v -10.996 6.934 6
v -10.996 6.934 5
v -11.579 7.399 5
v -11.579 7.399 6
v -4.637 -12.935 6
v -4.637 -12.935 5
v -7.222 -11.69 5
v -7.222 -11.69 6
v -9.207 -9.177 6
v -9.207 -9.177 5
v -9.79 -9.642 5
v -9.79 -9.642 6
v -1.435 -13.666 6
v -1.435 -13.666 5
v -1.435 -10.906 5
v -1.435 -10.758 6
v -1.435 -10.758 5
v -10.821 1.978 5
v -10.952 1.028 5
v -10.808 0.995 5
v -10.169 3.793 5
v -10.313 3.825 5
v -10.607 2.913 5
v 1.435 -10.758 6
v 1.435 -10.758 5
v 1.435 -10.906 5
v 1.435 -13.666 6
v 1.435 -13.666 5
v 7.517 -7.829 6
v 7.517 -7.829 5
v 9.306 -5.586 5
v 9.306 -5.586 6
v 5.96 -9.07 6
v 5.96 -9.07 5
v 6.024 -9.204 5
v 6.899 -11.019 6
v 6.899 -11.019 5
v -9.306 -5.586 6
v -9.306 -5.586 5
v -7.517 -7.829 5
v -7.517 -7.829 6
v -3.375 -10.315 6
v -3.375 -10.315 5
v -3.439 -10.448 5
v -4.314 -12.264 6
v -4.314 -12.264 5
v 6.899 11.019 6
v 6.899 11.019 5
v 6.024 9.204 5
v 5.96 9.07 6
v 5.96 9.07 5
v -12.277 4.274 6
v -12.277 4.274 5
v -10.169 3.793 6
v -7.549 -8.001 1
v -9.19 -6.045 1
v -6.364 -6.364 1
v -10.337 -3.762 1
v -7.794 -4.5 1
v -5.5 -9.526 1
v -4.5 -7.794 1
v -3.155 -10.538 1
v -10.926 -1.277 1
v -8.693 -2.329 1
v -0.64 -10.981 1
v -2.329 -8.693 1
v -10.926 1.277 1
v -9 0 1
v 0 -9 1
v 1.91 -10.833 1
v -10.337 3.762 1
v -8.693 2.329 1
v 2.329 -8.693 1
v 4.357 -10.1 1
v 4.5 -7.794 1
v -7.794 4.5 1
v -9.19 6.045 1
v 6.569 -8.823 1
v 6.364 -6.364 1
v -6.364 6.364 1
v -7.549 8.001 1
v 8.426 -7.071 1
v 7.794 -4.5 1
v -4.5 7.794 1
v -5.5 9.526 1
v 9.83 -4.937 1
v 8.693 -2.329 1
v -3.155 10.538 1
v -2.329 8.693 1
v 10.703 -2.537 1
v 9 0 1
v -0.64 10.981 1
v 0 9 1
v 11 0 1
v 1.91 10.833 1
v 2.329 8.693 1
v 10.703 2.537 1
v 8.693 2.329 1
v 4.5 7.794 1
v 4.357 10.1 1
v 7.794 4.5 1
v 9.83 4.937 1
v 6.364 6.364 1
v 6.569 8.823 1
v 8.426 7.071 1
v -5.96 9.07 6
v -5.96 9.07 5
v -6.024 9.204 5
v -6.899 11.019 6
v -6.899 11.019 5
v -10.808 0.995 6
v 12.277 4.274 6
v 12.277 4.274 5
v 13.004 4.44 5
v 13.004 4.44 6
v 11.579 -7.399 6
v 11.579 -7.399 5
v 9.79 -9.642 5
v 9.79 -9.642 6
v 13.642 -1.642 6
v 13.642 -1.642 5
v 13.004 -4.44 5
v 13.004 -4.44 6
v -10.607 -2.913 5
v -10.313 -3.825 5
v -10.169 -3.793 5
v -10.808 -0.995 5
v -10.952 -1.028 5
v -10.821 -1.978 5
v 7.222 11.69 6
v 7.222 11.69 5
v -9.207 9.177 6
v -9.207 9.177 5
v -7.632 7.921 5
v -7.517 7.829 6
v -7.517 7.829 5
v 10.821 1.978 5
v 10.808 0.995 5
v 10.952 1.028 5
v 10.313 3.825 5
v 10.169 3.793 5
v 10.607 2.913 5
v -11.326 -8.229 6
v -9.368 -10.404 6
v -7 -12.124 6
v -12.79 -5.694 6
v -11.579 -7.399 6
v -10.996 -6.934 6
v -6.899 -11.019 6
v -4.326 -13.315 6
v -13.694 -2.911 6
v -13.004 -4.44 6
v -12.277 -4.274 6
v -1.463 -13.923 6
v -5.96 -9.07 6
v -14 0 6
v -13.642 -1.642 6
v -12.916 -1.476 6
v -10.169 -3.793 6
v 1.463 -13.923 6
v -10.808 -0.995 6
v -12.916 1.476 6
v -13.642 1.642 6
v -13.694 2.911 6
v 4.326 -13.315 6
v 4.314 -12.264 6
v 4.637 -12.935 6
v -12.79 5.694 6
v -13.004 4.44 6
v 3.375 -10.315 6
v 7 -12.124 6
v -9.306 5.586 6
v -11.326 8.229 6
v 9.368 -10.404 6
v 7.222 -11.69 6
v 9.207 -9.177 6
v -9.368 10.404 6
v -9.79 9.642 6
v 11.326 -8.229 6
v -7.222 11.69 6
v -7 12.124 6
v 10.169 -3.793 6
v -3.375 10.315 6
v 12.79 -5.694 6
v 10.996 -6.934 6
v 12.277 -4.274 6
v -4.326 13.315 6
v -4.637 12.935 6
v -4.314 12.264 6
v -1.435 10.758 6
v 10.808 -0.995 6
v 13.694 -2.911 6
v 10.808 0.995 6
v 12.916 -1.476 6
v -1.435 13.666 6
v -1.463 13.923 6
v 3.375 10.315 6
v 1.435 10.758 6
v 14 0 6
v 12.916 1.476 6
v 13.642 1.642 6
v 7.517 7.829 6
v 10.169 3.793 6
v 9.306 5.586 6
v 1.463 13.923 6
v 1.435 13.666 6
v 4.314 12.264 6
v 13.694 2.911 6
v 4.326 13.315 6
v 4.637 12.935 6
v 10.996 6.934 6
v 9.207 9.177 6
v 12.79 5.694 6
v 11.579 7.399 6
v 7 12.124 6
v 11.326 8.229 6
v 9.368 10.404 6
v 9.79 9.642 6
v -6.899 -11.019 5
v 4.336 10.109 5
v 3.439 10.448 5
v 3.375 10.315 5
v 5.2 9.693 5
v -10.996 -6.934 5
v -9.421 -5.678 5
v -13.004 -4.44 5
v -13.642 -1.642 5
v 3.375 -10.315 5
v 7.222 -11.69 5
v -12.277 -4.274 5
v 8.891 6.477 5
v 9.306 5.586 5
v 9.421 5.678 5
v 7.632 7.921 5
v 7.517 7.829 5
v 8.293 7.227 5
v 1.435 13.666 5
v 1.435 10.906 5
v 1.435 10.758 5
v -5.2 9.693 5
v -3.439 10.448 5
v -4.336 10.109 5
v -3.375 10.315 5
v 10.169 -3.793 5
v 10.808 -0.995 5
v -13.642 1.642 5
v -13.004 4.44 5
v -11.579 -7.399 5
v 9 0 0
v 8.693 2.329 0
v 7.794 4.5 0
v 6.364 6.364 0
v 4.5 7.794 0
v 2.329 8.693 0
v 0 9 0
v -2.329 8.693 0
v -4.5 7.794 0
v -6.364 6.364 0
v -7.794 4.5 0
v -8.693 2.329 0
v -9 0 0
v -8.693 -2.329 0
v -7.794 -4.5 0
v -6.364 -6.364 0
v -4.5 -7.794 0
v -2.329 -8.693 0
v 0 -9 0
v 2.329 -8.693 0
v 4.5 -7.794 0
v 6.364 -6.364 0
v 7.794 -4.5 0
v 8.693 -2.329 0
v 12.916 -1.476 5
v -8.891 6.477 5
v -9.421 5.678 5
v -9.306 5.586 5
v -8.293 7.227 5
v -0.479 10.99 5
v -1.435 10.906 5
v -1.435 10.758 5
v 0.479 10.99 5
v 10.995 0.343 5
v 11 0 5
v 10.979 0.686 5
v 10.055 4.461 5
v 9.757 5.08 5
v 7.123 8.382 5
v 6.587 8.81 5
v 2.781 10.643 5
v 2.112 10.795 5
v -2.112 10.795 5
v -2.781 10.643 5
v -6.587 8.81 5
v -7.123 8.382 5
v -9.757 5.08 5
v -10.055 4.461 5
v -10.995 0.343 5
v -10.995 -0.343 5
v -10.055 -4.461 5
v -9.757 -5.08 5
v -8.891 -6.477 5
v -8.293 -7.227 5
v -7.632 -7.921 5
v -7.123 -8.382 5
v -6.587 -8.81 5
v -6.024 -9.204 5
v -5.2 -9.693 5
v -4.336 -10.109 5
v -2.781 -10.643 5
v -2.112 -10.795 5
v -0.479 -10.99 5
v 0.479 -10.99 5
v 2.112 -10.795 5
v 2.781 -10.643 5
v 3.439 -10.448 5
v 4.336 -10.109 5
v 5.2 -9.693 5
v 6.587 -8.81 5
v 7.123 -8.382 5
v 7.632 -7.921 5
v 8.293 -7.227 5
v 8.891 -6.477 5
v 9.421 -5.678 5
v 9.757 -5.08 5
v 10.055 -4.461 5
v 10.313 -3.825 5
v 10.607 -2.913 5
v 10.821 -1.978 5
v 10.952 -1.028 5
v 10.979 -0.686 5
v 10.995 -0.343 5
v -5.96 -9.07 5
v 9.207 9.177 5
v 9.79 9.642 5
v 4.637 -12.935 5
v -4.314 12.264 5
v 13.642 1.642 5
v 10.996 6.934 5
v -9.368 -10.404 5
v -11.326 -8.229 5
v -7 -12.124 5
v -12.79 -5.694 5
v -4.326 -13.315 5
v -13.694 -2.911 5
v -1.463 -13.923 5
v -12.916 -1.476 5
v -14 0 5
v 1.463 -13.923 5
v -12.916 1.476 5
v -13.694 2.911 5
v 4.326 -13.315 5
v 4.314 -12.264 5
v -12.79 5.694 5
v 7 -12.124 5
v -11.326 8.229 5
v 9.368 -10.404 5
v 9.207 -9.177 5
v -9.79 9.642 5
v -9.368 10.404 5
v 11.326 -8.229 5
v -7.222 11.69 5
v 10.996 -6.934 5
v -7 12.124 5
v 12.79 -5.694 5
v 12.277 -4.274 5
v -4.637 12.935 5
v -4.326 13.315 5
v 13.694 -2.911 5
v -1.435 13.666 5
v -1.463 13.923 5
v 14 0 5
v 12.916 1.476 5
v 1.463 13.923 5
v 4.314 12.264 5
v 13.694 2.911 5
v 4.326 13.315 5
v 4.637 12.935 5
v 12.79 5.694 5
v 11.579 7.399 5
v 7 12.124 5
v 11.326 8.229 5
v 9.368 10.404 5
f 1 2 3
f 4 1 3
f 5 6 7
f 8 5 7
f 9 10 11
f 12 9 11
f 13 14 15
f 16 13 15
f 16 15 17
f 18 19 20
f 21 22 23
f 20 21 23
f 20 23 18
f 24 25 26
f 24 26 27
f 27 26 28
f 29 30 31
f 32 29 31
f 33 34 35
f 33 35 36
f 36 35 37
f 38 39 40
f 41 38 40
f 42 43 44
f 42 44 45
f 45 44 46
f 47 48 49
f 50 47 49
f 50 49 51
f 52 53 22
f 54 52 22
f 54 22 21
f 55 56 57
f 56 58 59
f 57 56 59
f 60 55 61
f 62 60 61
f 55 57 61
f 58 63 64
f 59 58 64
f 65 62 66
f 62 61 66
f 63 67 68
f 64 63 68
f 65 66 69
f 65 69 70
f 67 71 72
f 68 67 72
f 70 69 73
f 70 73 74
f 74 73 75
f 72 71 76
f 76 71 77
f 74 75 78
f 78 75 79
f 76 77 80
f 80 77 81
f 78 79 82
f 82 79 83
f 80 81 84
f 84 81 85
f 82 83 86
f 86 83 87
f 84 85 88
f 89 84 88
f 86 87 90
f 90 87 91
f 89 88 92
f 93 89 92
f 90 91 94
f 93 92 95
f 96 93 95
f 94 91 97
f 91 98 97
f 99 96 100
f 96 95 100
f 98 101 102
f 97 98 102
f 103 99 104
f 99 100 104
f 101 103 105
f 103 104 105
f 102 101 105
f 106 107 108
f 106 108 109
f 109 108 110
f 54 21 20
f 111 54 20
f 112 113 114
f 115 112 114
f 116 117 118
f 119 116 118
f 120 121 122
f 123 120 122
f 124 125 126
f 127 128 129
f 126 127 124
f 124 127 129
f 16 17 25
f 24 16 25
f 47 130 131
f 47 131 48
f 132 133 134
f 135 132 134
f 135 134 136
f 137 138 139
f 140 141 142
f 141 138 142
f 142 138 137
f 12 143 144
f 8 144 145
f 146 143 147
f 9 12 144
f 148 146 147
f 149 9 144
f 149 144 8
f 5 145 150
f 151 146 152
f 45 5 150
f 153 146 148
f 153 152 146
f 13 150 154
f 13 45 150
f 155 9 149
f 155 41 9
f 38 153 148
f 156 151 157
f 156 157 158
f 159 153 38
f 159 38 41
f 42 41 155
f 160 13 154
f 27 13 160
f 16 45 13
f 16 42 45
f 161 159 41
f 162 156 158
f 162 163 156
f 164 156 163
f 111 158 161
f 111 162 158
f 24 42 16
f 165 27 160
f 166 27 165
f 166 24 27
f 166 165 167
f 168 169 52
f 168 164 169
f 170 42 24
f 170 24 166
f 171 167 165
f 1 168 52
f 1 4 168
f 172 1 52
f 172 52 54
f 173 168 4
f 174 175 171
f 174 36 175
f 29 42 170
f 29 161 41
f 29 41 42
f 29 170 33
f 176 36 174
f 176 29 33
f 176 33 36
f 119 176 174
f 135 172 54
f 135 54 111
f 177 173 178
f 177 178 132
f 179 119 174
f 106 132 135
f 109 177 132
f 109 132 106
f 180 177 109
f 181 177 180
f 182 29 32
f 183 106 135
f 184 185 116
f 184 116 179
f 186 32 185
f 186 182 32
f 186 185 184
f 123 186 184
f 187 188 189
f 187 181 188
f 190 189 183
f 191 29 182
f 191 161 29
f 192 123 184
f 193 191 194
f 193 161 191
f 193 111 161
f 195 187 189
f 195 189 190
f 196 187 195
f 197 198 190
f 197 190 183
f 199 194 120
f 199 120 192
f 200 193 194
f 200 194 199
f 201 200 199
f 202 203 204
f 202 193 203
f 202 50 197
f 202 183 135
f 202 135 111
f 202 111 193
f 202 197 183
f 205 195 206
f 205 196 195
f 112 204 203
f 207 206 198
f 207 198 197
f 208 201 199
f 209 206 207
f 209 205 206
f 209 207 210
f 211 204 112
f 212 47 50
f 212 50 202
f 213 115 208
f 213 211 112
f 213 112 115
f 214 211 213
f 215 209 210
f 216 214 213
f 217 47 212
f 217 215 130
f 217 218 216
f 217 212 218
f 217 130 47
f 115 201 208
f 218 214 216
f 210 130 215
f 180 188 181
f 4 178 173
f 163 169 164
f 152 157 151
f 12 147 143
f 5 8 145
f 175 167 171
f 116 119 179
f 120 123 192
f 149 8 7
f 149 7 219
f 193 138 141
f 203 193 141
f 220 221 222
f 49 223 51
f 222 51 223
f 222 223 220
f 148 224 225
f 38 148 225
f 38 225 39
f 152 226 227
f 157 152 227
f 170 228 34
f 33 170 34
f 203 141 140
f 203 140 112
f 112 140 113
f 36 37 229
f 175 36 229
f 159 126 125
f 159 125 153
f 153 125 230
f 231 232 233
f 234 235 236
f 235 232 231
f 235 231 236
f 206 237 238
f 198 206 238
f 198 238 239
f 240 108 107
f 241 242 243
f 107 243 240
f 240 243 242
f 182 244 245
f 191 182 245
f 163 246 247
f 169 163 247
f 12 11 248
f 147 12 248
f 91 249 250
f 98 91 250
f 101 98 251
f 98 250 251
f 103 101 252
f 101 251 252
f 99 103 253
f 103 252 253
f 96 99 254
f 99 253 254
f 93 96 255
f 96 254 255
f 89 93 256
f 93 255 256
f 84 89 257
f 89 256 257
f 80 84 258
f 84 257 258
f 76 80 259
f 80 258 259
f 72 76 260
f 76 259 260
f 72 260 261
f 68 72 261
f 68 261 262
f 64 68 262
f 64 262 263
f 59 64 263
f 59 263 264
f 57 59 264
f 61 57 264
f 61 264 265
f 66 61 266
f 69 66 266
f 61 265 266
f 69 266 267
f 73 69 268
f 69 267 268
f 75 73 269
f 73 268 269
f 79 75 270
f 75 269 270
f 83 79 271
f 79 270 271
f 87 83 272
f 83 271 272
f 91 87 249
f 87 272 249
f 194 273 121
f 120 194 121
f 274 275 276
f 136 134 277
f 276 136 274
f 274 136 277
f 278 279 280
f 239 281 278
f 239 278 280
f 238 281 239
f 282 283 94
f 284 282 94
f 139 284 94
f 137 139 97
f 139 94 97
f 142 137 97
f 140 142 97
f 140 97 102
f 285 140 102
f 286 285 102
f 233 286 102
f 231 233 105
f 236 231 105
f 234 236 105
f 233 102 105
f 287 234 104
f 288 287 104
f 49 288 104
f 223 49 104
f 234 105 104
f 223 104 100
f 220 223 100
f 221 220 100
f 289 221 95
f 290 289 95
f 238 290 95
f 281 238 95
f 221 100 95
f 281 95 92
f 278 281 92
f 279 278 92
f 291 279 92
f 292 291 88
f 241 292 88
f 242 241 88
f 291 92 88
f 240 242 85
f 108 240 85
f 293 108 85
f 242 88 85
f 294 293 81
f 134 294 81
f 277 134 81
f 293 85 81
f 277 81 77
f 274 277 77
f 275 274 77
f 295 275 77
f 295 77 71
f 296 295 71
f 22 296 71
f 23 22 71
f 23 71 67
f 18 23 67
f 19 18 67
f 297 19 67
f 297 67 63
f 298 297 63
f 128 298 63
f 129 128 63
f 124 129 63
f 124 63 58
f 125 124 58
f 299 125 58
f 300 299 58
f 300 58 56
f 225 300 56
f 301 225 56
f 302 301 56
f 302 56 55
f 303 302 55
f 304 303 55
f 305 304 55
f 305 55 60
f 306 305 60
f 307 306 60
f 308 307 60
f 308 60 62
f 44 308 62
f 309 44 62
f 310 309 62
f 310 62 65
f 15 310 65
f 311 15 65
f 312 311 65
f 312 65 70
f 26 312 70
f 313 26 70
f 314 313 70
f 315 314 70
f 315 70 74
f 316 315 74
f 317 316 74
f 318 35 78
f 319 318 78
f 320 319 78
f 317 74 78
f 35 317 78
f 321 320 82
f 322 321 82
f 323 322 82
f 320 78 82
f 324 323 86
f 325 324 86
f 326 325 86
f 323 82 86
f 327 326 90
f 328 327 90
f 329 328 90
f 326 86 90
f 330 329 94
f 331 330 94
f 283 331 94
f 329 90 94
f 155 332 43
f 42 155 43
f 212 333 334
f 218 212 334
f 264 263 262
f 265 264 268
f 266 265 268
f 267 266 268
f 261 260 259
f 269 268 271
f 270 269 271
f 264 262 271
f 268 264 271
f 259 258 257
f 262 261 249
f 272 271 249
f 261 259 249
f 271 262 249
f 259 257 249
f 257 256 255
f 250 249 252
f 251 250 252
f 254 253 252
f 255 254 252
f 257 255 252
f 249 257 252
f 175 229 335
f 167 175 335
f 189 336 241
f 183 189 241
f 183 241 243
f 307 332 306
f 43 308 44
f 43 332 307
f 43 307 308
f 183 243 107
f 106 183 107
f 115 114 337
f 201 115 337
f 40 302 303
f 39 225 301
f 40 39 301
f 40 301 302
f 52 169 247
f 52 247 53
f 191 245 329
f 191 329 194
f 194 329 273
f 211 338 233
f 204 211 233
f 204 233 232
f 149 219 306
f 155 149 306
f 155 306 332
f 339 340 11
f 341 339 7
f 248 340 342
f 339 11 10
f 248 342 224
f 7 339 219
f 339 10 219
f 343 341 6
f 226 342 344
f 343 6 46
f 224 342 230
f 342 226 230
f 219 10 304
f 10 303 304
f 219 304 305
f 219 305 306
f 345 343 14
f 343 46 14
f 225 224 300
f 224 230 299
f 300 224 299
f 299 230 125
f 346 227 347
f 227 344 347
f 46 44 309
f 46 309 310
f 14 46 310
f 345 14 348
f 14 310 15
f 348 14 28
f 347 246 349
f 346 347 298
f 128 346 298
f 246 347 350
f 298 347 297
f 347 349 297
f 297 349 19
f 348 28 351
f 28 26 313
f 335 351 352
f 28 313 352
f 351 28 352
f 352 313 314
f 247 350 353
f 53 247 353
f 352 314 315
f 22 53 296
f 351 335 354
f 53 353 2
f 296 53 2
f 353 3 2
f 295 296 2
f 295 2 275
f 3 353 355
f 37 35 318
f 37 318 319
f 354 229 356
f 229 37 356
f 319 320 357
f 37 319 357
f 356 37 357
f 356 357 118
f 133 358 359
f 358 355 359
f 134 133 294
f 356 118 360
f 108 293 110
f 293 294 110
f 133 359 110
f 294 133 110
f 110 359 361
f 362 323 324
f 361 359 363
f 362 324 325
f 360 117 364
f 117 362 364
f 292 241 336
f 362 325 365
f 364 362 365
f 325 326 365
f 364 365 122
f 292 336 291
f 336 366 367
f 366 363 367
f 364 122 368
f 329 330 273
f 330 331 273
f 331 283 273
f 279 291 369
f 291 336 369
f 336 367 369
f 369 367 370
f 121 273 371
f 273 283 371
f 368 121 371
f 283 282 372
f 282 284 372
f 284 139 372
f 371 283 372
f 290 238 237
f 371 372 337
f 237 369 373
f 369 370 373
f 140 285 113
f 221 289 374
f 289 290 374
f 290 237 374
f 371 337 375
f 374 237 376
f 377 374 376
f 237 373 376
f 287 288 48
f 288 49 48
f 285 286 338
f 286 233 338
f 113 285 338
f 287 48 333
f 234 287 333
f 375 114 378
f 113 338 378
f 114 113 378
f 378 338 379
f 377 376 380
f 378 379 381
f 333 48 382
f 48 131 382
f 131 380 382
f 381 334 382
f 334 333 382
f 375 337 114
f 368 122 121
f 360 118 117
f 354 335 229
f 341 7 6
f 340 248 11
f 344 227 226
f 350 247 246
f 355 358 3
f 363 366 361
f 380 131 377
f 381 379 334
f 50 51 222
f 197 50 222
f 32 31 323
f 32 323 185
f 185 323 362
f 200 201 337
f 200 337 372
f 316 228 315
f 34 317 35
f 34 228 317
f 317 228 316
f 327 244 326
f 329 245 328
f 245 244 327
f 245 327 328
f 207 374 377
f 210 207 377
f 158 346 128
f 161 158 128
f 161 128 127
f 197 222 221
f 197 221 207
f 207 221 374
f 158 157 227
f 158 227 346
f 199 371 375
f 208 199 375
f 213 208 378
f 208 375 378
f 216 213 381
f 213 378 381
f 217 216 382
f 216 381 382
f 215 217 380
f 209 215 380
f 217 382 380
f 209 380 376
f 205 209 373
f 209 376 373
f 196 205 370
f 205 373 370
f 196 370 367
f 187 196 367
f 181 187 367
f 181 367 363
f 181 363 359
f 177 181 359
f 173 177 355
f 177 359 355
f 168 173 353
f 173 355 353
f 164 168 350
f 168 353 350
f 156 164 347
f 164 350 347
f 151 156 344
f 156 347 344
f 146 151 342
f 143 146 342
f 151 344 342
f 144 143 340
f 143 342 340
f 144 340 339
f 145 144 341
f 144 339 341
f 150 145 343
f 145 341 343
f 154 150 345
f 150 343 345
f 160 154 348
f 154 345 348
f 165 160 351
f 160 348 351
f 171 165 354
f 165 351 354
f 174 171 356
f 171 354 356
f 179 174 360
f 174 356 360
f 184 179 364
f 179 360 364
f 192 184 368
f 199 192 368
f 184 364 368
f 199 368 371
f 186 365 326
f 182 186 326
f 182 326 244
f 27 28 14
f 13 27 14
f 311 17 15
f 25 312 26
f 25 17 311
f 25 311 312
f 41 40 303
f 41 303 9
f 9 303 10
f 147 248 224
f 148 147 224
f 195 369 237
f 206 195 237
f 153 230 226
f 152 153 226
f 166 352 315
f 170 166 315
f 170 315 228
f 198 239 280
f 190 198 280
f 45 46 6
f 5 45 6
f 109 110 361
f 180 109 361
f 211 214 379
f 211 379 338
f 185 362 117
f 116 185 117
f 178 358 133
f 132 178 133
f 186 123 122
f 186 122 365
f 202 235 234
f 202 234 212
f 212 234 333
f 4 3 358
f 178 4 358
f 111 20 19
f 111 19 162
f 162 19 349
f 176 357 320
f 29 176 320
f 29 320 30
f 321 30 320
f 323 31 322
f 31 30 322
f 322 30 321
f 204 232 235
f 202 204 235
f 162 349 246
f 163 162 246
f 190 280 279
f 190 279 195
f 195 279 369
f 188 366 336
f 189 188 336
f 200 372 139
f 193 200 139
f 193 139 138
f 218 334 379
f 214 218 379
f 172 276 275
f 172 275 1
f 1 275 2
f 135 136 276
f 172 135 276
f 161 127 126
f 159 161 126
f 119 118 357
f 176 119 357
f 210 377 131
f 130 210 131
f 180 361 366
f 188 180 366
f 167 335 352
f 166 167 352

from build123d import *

# Parameters (mm, degrees)
F0_R     = 9
F1_DEPTH = 1
F3_R     = 11
F4_DEPTH = 4
F6_R     = 14
F7_DEPTH = 1


with BuildPart() as f1:
    # F0 (on Top) → F1 (new body)
    with BuildSketch(Plane.XY):
        Circle(F0_R)
    extrude(amount=F1_DEPTH)

    # F3 (on offset) → F4 (join)
    with BuildSketch(Plane.XY.offset(1)):
        Circle(F3_R)
    extrude(amount=F4_DEPTH)

    # F6 (on offset) → F7 (join)
    with BuildSketch(Plane.XY.offset(5)):
        Circle(F6_R)
        with BuildLine():
            ThreePointArc((12.91588, 1.476495), (12.978953, 0.739444), (13, 0))
            ThreePointArc((13, 0), (12.978953, -0.739444), (12.91588, -1.476495))
            Line((12.91588, -1.476495), (13.642398, -1.642317))
            Line((13.642398, -1.642317), (13.003951, -4.439538))
            Line((13.003951, -4.439538), (12.277433, -4.273715))
            ThreePointArc((12.277433, -4.273715), (11.712595, -5.640489), (10.996179, -6.934266))
            Line((10.996179, -6.934266), (11.578801, -7.398892))
            Line((11.578801, -7.398892), (9.789912, -9.642088))
            Line((9.789912, -9.642088), (9.20729, -9.177463))
            ThreePointArc((9.20729, -9.177463), (8.105367, -10.163809), (6.89855, -11.018621))
            Line((6.89855, -11.018621), (7.221881, -11.690024))
            Line((7.221881, -11.690024), (4.63686, -12.934905))
            Line((4.63686, -12.934905), (4.31353, -12.263501))
            ThreePointArc((4.31353, -12.263501), (2.892772, -12.674063), (1.434578, -12.920603))
            Line((1.434578, -12.920603), (1.434578, -13.665805))
            Line((1.434578, -13.665805), (-1.434578, -13.665805))
            Line((-1.434578, -13.665805), (-1.434578, -12.920603))
            ThreePointArc((-1.434578, -12.920603), (-2.892772, -12.674063), (-4.31353, -12.263501))
            Line((-4.31353, -12.263501), (-4.63686, -12.934905))
            Line((-4.63686, -12.934905), (-7.221881, -11.690024))
            Line((-7.221881, -11.690024), (-6.89855, -11.018621))
            ThreePointArc((-6.89855, -11.018621), (-8.105367, -10.163809), (-9.20729, -9.177463))
            Line((-9.20729, -9.177463), (-9.789912, -9.642088))
            Line((-9.789912, -9.642088), (-11.578801, -7.398892))
            Line((-11.578801, -7.398892), (-10.996179, -6.934266))
            ThreePointArc((-10.996179, -6.934266), (-11.712595, -5.640489), (-12.277433, -4.273715))
            Line((-12.277433, -4.273715), (-13.003951, -4.439538))
            Line((-13.003951, -4.439538), (-13.642398, -1.642317))
            Line((-13.642398, -1.642317), (-12.91588, -1.476495))
            ThreePointArc((-12.91588, -1.476495), (-13, 0), (-12.91588, 1.476495))
            Line((-12.91588, 1.476495), (-13.642398, 1.642317))
            Line((-13.642398, 1.642317), (-13.003951, 4.439538))
            Line((-13.003951, 4.439538), (-12.277433, 4.273715))
            ThreePointArc((-12.277433, 4.273715), (-11.712595, 5.640489), (-10.996179, 6.934266))
            Line((-10.996179, 6.934266), (-11.578801, 7.398892))
            Line((-11.578801, 7.398892), (-9.789912, 9.642088))
            Line((-9.789912, 9.642088), (-9.20729, 9.177463))
            ThreePointArc((-9.20729, 9.177463), (-8.105367, 10.163809), (-6.89855, 11.018621))
            Line((-6.89855, 11.018621), (-7.221881, 11.690024))
            Line((-7.221881, 11.690024), (-4.63686, 12.934905))
            Line((-4.63686, 12.934905), (-4.31353, 12.263501))
            ThreePointArc((-4.31353, 12.263501), (-2.892772, 12.674063), (-1.434578, 12.920603))
            Line((-1.434578, 12.920603), (-1.434578, 13.665805))
            Line((-1.434578, 13.665805), (1.434578, 13.665805))
            Line((1.434578, 13.665805), (1.434578, 12.920603))
            ThreePointArc((1.434578, 12.920603), (2.892772, 12.674063), (4.31353, 12.263501))
            Line((4.31353, 12.263501), (4.63686, 12.934905))
            Line((4.63686, 12.934905), (7.221881, 11.690024))
            Line((7.221881, 11.690024), (6.89855, 11.018621))
            ThreePointArc((6.89855, 11.018621), (8.105367, 10.163809), (9.20729, 9.177463))
            Line((9.20729, 9.177463), (9.789912, 9.642088))
            Line((9.789912, 9.642088), (11.578801, 7.398892))
            Line((11.578801, 7.398892), (10.996179, 6.934266))
            ThreePointArc((10.996179, 6.934266), (11.712595, 5.640489), (12.277433, 4.273715))
            Line((12.277433, 4.273715), (13.003951, 4.439538))
            Line((13.003951, 4.439538), (13.642398, 1.642317))
            Line((13.642398, 1.642317), (12.91588, 1.476495))
        make_face(mode=Mode.SUBTRACT)
        with BuildLine():
            ThreePointArc((12.91588, -1.476495), (12.978953, -0.739444), (13, 0))
            ThreePointArc((13, 0), (12.978953, 0.739444), (12.91588, 1.476495))
            Line((12.91588, 1.476495), (10.807824, 0.995345))
            Line((10.807824, 0.995345), (10.169377, 3.792565))
            Line((10.169377, 3.792565), (12.277433, 4.273715))
            ThreePointArc((12.277433, 4.273715), (11.712595, 5.640489), (10.996179, 6.934266))
            Line((10.996179, 6.934266), (9.30565, 5.586114))
            Line((9.30565, 5.586114), (7.51676, 7.82931))
            Line((7.51676, 7.82931), (9.20729, 9.177463))
            ThreePointArc((9.20729, 9.177463), (8.105367, 10.163809), (6.89855, 11.018621))
            Line((6.89855, 11.018621), (5.960377, 9.070485))
            Line((5.960377, 9.070485), (3.375356, 10.315365))
            Line((3.375356, 10.315365), (4.31353, 12.263501))
            ThreePointArc((4.31353, 12.263501), (2.892772, 12.674063), (1.434578, 12.920603))
            Line((1.434578, 12.920603), (1.434578, 10.758335))
            Line((1.434578, 10.758335), (-1.434578, 10.758335))
            Line((-1.434578, 10.758335), (-1.434578, 12.920603))
            ThreePointArc((-1.434578, 12.920603), (-2.892772, 12.674063), (-4.31353, 12.263501))
            Line((-4.31353, 12.263501), (-3.375356, 10.315365))
            Line((-3.375356, 10.315365), (-5.960377, 9.070485))
            Line((-5.960377, 9.070485), (-6.89855, 11.018621))
            ThreePointArc((-6.89855, 11.018621), (-8.105367, 10.163809), (-9.20729, 9.177463))
            Line((-9.20729, 9.177463), (-7.51676, 7.82931))
            Line((-7.51676, 7.82931), (-9.30565, 5.586114))
            Line((-9.30565, 5.586114), (-10.996179, 6.934266))
            ThreePointArc((-10.996179, 6.934266), (-11.712595, 5.640489), (-12.277433, 4.273715))
            Line((-12.277433, 4.273715), (-10.169377, 3.792565))
            Line((-10.169377, 3.792565), (-10.807824, 0.995345))
            Line((-10.807824, 0.995345), (-12.91588, 1.476495))
            ThreePointArc((-12.91588, 1.476495), (-13, 0), (-12.91588, -1.476495))
            Line((-12.91588, -1.476495), (-10.807824, -0.995345))
            Line((-10.807824, -0.995345), (-10.169377, -3.792565))
            Line((-10.169377, -3.792565), (-12.277433, -4.273715))
            ThreePointArc((-12.277433, -4.273715), (-11.712595, -5.640489), (-10.996179, -6.934266))
            Line((-10.996179, -6.934266), (-9.30565, -5.586114))
            Line((-9.30565, -5.586114), (-7.51676, -7.82931))
            Line((-7.51676, -7.82931), (-9.20729, -9.177463))
            ThreePointArc((-9.20729, -9.177463), (-8.105367, -10.163809), (-6.89855, -11.018621))
            Line((-6.89855, -11.018621), (-5.960377, -9.070485))
            Line((-5.960377, -9.070485), (-3.375356, -10.315365))
            Line((-3.375356, -10.315365), (-4.31353, -12.263501))
            ThreePointArc((-4.31353, -12.263501), (-2.892772, -12.674063), (-1.434578, -12.920603))
            Line((-1.434578, -12.920603), (-1.434578, -10.758335))
            Line((-1.434578, -10.758335), (1.434578, -10.758335))
            Line((1.434578, -10.758335), (1.434578, -12.920603))
            ThreePointArc((1.434578, -12.920603), (2.892772, -12.674063), (4.31353, -12.263501))
            Line((4.31353, -12.263501), (3.375356, -10.315365))
            Line((3.375356, -10.315365), (5.960377, -9.070485))
            Line((5.960377, -9.070485), (6.89855, -11.018621))
            ThreePointArc((6.89855, -11.018621), (8.105367, -10.163809), (9.20729, -9.177463))
            Line((9.20729, -9.177463), (7.51676, -7.82931))
            Line((7.51676, -7.82931), (9.30565, -5.586114))
            Line((9.30565, -5.586114), (10.996179, -6.934266))
            ThreePointArc((10.996179, -6.934266), (11.712595, -5.640489), (12.277433, -4.273715))
            Line((12.277433, -4.273715), (10.169377, -3.792565))
            Line((10.169377, -3.792565), (10.807824, -0.995345))
            Line((10.807824, -0.995345), (12.91588, -1.476495))
        make_face()
    extrude(amount=F7_DEPTH)


solid = f1.part
